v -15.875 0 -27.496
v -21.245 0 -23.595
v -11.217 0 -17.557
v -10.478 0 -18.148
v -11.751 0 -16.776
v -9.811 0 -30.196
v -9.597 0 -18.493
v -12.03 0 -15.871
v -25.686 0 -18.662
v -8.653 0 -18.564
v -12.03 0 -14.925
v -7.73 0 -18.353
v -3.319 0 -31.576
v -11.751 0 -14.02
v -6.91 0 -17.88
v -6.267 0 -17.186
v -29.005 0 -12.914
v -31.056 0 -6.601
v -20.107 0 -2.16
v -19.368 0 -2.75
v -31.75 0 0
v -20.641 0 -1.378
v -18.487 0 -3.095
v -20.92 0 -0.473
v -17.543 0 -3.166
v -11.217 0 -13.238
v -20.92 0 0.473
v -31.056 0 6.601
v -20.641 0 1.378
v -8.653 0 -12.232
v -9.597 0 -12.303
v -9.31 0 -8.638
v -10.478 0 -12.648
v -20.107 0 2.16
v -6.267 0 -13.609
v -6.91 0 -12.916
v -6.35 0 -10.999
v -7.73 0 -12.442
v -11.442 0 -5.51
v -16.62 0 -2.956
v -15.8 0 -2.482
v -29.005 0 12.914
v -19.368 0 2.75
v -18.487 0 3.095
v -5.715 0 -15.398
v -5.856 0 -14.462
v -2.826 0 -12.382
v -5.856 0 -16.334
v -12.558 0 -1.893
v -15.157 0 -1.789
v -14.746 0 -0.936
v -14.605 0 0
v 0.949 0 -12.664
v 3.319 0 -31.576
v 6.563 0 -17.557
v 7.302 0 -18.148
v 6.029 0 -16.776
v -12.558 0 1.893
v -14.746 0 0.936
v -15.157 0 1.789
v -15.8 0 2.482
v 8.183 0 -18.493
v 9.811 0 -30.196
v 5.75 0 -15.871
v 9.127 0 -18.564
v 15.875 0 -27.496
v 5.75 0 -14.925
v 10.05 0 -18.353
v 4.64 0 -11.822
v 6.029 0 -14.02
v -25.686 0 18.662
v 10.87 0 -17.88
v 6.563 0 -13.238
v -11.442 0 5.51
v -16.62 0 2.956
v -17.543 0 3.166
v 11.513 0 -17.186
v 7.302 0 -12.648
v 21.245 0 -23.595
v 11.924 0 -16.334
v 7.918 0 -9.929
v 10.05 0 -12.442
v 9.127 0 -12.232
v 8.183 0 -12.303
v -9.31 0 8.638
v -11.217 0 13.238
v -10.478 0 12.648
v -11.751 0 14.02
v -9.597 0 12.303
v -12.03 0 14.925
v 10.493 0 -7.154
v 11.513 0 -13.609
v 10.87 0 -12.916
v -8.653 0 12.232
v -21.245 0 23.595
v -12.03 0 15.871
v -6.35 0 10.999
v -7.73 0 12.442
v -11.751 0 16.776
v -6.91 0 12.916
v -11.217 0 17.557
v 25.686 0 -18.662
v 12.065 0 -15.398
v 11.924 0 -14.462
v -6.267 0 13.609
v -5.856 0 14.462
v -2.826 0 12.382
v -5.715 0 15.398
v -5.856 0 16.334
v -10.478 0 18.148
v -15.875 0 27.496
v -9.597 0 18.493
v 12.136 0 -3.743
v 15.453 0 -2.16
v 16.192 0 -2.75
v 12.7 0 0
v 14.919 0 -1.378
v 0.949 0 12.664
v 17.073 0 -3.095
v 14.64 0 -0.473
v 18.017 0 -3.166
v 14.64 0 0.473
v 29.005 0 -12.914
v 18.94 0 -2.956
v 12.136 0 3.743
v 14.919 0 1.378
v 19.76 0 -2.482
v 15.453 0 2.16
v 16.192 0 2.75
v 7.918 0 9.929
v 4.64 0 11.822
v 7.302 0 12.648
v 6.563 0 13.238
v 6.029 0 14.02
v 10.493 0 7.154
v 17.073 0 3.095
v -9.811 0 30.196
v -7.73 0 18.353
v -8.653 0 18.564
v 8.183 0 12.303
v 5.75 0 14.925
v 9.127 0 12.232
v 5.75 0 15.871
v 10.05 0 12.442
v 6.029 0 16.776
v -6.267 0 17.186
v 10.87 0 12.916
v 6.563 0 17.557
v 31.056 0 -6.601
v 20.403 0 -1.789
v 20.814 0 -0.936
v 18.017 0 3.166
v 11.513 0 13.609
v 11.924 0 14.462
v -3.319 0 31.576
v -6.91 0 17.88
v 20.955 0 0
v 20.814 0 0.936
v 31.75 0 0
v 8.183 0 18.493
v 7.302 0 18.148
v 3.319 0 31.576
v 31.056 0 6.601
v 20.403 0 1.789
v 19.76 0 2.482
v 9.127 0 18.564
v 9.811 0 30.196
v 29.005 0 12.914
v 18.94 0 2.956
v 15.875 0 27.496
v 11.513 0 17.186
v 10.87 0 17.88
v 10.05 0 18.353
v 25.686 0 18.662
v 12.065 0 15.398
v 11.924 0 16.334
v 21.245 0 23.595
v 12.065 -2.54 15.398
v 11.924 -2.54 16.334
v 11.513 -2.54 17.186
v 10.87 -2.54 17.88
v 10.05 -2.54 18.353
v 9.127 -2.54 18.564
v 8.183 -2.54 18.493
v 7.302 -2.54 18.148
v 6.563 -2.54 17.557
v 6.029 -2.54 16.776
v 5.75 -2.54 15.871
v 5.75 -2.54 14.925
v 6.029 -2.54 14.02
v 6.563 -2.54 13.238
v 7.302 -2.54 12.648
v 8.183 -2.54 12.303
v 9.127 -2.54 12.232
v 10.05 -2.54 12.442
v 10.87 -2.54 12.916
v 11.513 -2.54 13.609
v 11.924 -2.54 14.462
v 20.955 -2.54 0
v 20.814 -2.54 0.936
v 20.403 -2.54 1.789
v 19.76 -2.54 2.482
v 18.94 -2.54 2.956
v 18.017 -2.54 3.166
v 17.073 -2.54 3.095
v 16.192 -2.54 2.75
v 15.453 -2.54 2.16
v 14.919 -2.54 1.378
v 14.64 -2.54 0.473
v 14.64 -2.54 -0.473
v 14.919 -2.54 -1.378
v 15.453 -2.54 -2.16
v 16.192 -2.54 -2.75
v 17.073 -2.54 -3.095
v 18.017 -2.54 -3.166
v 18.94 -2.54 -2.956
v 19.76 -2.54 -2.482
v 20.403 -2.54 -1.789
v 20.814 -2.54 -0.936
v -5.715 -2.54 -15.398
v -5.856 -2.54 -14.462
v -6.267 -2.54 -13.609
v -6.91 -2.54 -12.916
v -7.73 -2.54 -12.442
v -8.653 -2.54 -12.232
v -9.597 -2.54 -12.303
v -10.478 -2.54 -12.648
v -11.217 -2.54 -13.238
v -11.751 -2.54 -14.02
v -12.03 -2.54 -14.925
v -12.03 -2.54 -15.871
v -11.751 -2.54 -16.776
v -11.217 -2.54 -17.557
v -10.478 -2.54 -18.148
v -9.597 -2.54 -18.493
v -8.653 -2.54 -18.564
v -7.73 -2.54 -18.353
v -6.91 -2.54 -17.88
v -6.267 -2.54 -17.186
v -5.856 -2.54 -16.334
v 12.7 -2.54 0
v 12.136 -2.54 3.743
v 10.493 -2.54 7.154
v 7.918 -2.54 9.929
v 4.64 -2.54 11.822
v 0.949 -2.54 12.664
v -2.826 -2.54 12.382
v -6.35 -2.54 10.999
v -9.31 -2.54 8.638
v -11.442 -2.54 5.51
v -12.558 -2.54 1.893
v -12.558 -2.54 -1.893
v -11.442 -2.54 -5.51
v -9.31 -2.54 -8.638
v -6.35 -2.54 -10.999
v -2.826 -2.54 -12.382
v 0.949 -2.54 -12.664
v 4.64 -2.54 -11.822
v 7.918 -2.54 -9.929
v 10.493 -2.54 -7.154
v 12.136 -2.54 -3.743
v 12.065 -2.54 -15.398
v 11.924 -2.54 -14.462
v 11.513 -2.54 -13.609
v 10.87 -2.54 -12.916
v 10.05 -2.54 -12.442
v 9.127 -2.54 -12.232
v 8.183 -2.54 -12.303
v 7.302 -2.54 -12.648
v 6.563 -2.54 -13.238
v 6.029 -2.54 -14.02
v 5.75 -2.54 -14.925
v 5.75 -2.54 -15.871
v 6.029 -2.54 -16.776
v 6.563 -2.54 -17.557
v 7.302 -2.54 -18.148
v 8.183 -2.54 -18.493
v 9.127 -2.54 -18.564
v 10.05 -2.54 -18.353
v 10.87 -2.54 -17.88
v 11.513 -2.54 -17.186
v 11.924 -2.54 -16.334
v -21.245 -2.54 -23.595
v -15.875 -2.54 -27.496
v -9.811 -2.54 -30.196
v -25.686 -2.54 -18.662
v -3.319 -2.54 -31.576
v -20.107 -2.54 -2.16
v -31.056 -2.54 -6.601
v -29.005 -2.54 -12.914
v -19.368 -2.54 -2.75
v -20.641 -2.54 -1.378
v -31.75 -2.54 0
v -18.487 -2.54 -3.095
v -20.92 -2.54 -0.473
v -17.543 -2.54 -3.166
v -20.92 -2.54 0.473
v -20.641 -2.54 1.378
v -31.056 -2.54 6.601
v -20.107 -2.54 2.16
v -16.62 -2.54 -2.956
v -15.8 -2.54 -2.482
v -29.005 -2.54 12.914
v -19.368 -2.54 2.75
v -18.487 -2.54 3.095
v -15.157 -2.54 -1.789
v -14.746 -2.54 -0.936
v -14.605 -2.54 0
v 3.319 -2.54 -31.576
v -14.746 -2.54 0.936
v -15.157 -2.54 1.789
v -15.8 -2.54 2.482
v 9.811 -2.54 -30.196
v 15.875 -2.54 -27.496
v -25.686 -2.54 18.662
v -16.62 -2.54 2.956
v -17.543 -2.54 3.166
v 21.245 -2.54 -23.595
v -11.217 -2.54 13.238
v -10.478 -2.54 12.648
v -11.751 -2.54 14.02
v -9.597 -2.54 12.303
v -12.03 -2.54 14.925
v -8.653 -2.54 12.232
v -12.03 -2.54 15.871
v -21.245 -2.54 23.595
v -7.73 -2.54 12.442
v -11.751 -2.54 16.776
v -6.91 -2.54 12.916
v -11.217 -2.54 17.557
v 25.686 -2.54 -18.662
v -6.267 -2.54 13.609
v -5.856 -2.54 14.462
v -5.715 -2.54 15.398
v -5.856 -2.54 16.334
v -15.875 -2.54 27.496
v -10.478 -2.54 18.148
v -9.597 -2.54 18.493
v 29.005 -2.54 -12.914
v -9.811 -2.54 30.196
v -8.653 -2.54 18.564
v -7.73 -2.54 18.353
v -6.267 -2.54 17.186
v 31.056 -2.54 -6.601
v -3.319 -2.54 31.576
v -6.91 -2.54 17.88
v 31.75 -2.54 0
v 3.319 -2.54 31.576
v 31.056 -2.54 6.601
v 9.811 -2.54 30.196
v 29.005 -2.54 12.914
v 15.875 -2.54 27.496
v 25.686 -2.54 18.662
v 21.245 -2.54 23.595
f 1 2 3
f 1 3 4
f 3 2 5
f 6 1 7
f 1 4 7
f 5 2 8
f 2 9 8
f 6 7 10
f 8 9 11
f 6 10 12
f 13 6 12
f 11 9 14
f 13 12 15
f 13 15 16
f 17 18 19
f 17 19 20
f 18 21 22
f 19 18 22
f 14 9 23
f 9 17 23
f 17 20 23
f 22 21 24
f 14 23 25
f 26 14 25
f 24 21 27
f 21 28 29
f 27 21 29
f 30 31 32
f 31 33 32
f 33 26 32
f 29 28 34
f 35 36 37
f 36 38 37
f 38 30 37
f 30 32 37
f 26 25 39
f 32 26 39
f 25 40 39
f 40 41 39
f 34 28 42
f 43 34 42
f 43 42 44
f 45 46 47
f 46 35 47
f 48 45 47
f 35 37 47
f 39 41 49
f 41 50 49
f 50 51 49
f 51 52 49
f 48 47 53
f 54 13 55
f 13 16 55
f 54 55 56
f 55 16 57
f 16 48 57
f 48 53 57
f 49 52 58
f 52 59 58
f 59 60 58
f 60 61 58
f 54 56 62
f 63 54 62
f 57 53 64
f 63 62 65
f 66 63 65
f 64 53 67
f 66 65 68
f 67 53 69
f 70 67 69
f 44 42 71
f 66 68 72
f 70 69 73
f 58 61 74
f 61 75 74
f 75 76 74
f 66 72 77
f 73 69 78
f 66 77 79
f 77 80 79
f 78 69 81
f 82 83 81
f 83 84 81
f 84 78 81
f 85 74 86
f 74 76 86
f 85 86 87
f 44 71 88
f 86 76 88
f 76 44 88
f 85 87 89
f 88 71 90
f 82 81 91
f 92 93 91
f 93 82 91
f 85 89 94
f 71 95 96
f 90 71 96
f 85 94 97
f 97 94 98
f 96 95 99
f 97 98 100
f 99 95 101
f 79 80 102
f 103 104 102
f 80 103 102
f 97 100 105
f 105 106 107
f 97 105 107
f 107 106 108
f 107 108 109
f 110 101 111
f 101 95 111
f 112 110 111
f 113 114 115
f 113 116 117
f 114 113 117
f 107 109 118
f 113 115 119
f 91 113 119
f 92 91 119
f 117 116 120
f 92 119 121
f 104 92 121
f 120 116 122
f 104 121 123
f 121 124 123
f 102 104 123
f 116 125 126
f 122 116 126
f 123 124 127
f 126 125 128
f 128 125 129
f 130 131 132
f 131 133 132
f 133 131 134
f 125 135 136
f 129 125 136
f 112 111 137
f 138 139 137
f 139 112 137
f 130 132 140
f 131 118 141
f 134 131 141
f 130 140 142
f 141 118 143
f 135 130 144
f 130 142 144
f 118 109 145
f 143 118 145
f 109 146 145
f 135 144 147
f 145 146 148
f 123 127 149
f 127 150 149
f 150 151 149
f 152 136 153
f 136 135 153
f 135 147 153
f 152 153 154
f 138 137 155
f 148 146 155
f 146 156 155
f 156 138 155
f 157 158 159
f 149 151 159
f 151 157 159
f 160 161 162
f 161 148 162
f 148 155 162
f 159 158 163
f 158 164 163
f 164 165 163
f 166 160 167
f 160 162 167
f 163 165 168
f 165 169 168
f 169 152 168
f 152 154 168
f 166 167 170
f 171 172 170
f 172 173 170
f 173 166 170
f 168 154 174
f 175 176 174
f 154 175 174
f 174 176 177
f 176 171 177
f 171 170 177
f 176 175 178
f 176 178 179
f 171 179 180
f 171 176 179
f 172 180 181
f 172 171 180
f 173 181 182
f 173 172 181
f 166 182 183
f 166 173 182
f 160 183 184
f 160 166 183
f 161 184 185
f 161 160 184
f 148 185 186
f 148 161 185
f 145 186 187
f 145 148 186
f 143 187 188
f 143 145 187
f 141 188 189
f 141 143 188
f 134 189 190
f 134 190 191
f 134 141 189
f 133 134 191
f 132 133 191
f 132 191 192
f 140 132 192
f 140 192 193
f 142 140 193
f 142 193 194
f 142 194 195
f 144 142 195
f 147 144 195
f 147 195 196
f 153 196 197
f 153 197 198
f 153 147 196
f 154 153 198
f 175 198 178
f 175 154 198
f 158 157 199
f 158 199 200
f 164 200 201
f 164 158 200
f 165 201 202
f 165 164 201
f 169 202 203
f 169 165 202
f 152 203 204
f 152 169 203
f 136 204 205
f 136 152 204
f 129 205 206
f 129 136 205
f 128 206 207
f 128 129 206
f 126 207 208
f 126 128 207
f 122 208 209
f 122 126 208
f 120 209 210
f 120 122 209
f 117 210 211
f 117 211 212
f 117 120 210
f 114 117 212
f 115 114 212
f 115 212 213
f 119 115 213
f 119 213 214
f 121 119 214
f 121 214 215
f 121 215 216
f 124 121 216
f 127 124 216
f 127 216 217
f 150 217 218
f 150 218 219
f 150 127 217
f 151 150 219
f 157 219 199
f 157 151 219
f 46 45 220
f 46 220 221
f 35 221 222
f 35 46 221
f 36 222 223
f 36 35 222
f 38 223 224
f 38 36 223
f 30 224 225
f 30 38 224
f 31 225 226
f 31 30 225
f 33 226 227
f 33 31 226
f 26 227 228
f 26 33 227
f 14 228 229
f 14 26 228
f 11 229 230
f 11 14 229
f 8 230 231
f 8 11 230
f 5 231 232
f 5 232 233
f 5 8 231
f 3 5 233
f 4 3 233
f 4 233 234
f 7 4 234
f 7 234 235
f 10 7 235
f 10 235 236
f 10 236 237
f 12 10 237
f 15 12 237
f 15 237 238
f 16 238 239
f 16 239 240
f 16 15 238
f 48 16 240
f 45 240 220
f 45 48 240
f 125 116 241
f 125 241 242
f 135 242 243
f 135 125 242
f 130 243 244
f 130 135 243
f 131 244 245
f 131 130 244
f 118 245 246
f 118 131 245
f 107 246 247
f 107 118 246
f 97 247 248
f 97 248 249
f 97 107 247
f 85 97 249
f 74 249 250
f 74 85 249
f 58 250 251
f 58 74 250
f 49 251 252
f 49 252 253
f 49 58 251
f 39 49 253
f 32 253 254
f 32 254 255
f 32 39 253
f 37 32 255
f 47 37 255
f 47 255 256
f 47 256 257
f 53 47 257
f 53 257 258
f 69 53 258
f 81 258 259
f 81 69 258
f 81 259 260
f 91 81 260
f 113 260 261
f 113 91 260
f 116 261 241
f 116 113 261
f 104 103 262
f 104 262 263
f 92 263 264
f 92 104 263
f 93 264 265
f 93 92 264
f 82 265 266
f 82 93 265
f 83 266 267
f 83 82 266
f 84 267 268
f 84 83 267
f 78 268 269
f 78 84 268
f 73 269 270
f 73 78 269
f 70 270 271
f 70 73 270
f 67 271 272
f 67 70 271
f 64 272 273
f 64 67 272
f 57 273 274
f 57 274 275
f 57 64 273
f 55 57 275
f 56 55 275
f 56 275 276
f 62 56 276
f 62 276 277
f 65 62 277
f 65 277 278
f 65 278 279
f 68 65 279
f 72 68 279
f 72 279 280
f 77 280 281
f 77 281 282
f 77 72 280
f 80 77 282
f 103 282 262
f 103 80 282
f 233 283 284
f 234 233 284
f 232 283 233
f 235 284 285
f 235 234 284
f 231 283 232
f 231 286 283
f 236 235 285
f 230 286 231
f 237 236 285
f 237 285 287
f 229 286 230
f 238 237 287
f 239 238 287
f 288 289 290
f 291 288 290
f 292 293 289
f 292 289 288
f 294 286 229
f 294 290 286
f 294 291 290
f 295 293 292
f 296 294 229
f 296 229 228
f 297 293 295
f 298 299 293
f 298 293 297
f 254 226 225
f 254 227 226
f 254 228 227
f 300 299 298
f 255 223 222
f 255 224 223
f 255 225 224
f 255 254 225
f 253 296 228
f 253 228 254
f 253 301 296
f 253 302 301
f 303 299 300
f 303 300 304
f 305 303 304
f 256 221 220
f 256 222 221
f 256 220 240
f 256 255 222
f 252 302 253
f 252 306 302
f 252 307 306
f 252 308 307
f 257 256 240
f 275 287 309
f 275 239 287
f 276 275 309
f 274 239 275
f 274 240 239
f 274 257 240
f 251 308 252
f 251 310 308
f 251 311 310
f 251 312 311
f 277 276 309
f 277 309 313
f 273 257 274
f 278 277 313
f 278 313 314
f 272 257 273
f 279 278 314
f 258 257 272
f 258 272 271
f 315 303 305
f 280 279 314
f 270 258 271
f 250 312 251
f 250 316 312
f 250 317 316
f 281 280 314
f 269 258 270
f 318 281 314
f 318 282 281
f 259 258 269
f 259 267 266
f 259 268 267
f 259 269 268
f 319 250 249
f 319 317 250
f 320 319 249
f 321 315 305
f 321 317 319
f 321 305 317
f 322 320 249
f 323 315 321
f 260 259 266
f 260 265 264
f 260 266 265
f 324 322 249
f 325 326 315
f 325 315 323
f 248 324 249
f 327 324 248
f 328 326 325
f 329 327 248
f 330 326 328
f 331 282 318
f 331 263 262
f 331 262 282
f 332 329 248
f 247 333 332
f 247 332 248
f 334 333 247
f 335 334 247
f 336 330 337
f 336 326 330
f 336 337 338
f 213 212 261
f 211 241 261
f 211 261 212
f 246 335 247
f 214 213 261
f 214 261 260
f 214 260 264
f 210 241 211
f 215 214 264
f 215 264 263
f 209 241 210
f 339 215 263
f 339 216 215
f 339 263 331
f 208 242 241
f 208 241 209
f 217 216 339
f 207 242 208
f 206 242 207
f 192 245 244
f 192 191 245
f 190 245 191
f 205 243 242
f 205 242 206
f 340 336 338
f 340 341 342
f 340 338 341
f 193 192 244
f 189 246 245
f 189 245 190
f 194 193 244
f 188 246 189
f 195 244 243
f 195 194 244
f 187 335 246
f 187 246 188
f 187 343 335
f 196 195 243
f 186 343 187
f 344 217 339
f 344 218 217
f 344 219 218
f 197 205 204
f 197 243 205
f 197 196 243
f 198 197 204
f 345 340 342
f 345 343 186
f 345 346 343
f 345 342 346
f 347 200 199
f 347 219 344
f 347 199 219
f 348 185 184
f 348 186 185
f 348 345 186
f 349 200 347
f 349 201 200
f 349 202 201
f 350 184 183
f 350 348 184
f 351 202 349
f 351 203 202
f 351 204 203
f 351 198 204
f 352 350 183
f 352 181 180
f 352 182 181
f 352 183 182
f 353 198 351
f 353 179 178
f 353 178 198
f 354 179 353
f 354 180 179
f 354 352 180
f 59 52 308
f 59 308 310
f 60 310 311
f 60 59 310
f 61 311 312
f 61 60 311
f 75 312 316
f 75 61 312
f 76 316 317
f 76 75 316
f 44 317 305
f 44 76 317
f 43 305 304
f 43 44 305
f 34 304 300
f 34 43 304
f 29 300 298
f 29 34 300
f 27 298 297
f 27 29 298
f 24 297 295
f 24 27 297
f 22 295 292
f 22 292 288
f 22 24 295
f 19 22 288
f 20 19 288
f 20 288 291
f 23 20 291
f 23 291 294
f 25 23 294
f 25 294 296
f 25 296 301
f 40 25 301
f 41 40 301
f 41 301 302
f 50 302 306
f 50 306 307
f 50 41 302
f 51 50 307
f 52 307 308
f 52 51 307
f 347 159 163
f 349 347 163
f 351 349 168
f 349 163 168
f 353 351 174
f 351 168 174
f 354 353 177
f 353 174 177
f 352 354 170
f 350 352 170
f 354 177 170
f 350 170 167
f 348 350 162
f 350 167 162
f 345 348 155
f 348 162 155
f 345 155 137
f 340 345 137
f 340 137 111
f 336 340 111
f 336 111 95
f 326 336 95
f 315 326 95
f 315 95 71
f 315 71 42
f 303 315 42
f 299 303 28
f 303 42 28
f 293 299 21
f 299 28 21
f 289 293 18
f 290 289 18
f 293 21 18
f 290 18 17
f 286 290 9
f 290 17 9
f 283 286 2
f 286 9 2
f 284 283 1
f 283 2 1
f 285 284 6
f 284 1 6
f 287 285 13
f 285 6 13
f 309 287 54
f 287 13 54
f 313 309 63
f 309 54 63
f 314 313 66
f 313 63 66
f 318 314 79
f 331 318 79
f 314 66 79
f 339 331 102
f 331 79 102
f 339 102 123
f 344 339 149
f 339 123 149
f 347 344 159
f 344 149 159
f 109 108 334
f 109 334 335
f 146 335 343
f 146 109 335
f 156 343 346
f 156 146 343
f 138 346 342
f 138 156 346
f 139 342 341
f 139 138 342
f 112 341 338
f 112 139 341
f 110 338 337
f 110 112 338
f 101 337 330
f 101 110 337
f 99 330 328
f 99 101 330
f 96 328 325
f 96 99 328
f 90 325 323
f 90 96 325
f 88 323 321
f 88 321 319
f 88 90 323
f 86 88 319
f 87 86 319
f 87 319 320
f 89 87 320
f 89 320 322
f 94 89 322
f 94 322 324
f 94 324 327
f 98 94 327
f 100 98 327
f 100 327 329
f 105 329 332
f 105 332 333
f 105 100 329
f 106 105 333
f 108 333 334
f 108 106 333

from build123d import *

# Parameters (mm, degrees)
F0_R     = 31.75
F0_R_2   = 3.175
F0_R_3   = 12.7
F1_DEPTH = 2.54


with BuildPart() as f1:
    # F0 (on Front) → F1 (new body)
    with BuildSketch(Plane.XZ):
        Circle(F0_R)
        with Locations((-8.89, -15.397932)):
            Circle(F0_R_2, mode=Mode.SUBTRACT)
        with Locations((8.89, -15.397932)):
            Circle(F0_R_2, mode=Mode.SUBTRACT)
        with Locations((-17.78, 0)):
            Circle(F0_R_2, mode=Mode.SUBTRACT)
        with Locations((-8.89, 15.397932)):
            Circle(F0_R_2, mode=Mode.SUBTRACT)
        Circle(F0_R_3, mode=Mode.SUBTRACT)
        with Locations((8.89, 15.397932)):
            Circle(F0_R_2, mode=Mode.SUBTRACT)
        with Locations((17.78, 0)):
            Circle(F0_R_2, mode=Mode.SUBTRACT)
    extrude(amount=F1_DEPTH)


solid = f1.part
